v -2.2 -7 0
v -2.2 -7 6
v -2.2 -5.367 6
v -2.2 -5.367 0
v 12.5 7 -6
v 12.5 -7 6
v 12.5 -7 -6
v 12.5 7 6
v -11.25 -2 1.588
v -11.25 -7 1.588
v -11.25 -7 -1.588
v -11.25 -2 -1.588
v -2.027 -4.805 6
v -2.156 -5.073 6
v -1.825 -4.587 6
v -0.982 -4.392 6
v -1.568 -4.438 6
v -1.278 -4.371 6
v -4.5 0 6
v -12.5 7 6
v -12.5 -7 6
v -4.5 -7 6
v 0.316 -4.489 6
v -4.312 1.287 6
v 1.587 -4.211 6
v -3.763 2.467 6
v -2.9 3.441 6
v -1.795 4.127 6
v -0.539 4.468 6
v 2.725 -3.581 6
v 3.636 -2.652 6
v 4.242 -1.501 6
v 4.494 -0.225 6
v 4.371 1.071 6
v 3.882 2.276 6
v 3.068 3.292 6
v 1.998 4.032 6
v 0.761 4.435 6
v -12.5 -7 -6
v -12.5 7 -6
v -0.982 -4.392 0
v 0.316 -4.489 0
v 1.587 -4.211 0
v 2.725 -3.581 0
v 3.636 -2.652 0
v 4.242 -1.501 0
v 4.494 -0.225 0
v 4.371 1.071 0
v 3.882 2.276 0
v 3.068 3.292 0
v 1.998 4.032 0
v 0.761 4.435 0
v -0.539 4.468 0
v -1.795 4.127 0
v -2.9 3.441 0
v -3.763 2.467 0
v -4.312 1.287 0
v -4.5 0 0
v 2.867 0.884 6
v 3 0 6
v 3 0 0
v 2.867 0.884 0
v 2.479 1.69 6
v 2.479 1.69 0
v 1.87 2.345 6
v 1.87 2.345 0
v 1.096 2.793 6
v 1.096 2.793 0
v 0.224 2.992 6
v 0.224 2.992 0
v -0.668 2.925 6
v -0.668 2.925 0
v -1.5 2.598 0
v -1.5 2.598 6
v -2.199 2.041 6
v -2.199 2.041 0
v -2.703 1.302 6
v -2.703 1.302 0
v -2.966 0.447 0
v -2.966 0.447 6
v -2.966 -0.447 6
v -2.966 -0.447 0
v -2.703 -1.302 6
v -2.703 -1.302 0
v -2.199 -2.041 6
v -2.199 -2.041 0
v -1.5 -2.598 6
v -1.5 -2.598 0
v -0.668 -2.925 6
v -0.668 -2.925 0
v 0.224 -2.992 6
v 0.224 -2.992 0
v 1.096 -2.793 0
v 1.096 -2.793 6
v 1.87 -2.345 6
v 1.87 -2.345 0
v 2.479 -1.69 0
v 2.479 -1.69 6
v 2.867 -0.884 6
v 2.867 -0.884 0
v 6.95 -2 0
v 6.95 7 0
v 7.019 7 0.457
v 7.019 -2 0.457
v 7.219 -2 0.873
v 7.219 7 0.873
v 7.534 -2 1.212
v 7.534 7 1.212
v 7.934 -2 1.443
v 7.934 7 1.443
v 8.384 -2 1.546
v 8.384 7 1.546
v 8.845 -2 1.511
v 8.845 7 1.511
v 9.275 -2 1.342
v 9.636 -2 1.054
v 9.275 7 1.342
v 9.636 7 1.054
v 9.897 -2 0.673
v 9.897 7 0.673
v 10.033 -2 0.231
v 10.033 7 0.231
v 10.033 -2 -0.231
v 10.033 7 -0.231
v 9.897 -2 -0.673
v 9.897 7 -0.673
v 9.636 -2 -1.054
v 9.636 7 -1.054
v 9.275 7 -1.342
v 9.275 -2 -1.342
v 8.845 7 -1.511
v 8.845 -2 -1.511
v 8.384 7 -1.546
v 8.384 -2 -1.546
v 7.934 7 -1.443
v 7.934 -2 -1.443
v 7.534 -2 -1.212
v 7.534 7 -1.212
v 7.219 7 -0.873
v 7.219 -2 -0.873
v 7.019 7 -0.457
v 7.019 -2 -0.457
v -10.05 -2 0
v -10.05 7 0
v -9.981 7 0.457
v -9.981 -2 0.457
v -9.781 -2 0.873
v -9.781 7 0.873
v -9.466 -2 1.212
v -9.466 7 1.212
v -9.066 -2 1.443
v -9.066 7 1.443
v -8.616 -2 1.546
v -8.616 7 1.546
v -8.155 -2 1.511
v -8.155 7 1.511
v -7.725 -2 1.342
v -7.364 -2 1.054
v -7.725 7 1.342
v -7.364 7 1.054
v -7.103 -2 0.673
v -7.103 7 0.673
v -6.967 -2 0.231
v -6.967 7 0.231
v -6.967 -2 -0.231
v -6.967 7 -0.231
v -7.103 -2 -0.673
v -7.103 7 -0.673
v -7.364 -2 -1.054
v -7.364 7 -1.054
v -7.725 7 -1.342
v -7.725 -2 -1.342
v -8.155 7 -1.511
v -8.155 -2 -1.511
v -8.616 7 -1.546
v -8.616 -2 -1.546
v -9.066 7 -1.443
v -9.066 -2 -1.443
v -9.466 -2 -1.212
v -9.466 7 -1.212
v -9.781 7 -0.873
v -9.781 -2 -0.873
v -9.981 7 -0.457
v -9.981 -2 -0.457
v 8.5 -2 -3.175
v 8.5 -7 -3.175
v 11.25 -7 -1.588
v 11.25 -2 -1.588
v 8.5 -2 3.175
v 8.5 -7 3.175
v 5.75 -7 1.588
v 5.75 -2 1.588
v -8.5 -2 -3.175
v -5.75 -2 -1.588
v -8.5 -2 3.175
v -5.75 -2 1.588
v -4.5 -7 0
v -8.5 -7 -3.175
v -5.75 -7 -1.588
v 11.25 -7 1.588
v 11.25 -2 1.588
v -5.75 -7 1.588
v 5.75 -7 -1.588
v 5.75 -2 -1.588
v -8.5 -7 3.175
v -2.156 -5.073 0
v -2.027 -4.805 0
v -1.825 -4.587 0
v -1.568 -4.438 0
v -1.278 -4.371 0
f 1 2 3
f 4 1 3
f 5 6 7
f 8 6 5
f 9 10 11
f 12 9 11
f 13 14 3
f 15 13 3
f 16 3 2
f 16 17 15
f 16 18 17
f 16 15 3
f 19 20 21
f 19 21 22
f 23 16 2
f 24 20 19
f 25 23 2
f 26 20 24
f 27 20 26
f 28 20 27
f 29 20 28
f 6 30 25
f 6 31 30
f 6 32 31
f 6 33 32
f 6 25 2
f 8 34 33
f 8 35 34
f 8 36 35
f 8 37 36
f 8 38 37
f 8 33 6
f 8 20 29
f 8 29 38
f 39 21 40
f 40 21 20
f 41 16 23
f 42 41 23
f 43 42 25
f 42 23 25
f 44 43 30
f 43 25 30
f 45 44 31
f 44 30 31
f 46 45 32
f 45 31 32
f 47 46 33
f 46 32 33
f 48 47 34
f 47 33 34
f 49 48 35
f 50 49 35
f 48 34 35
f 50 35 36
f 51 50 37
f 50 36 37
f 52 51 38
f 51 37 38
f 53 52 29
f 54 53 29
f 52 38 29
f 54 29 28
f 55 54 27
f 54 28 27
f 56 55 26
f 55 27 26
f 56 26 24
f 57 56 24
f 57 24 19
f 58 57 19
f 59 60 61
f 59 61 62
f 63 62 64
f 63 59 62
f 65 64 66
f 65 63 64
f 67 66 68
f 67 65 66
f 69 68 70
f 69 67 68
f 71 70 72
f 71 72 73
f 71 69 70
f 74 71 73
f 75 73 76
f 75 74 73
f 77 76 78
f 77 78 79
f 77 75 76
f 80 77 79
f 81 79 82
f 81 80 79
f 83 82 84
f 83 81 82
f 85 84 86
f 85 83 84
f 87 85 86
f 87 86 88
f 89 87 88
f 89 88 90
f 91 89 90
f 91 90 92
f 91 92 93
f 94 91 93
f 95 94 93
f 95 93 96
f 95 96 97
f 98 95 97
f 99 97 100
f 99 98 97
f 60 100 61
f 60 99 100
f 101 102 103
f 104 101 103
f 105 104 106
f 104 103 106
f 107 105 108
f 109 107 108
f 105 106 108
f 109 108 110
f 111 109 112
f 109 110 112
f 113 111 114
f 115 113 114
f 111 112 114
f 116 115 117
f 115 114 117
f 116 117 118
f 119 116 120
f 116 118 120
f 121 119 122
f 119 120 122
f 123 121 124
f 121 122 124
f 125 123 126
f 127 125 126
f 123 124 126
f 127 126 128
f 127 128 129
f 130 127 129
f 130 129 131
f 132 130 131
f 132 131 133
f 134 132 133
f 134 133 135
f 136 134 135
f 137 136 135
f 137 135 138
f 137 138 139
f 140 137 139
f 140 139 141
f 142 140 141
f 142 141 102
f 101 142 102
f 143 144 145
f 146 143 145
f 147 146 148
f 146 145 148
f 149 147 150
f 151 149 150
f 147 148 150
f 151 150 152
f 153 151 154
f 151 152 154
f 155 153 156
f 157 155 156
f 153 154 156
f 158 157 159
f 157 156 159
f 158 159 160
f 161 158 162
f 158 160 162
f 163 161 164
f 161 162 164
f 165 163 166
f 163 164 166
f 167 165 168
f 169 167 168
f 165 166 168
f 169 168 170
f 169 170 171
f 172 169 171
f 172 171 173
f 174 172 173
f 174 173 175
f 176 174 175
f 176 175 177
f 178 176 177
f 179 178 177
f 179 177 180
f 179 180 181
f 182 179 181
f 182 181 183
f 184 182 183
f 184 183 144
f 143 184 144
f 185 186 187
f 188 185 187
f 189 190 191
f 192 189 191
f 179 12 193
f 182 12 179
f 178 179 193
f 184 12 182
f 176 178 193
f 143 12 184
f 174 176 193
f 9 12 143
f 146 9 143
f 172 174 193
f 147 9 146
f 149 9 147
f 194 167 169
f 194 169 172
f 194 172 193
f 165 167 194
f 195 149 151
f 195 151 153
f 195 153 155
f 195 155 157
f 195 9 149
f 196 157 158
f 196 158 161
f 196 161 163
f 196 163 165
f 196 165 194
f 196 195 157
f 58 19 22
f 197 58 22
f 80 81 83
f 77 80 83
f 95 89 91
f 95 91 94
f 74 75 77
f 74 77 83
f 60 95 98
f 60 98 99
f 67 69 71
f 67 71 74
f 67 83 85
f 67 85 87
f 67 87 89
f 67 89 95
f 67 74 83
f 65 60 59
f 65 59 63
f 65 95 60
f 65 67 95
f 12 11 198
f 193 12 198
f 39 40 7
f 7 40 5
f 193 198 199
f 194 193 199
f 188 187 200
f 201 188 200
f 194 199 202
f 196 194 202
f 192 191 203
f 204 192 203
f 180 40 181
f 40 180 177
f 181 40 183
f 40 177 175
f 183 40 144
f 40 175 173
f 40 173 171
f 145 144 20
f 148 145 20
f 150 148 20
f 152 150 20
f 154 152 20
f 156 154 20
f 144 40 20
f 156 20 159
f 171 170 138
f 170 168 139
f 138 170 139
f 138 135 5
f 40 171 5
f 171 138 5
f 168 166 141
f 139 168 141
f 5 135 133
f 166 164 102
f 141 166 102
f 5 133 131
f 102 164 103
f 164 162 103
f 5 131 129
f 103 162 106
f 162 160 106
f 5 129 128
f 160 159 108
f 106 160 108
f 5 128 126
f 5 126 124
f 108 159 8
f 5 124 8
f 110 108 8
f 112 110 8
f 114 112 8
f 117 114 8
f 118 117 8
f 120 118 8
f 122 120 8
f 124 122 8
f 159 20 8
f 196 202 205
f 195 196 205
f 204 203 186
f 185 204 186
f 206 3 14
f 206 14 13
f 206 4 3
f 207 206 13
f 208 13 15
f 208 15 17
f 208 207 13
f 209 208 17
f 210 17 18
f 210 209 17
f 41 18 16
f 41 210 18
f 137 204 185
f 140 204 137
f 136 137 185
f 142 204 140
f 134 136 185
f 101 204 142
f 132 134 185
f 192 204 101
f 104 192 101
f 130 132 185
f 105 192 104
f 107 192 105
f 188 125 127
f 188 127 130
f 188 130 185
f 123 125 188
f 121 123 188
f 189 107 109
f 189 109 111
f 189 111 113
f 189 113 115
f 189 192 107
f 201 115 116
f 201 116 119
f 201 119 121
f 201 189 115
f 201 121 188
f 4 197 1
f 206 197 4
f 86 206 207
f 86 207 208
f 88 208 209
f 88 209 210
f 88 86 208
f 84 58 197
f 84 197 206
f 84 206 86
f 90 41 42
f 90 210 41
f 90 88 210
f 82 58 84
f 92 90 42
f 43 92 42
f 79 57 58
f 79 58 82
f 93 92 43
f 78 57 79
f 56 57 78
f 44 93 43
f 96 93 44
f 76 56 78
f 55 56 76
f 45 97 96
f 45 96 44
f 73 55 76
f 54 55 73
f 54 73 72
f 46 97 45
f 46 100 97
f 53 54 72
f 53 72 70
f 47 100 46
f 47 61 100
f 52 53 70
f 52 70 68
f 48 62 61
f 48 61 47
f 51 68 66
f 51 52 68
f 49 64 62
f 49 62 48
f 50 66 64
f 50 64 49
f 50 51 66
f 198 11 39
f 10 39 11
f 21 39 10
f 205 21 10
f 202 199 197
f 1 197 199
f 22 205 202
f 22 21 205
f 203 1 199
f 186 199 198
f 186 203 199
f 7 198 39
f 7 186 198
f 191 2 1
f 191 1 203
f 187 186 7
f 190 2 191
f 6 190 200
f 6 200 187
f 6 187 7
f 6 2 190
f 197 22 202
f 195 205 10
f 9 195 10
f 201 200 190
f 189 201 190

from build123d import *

# Parameters (mm, degrees)
SKETCH_W        = 25
SKETCH_H        = 14
PAD_DEPTH       = 6
SKETCH001_R     = 3
POCKET_DEPTH    = 6
SKETCH002_R     = 1.55
POCKET001_DEPTH = 15
POCKET002_DEPTH = 5
FILLET_R        = 1


with BuildPart() as part:
    # Sketch → Pad (new body, symmetric)
    with BuildSketch(Plane.XY):
        Rectangle(SKETCH_W, SKETCH_H)
    extrude(amount=PAD_DEPTH, both=True)

    # Sketch001 → Pocket (cut)
    with BuildSketch(Plane.XY.offset(6)):
        with BuildLine():
            ThreePointArc((-2.2, -3.925557), (3.882654, 2.274863), (-4.5, 0))
            Line((-4.5, 0), (-4.5, -7))
            Line((-4.5, -7), (-2.2, -7))
            Line((-2.2, -7), (-2.2, -3.925557))
        make_face()
        Circle(SKETCH001_R, mode=Mode.SUBTRACT)
    extrude(amount=-POCKET_DEPTH, mode=Mode.SUBTRACT)

    # Sketch002 → Pocket001 (cut)
    with BuildSketch(Plane(origin=(0, 7, 0), x_dir=(-1, 0, 0), z_dir=(0, 1, 0))):
        with Locations((-8.5, 0)):
            Circle(SKETCH002_R)
        with Locations((8.5, 0)):
            Circle(SKETCH002_R)
    extrude(amount=-POCKET001_DEPTH, mode=Mode.SUBTRACT)

    # Sketch003 → Pocket002 (cut)
    with BuildSketch(Plane.XZ.offset(7)):
        Polygon((-5.75, -1.587713), (-5.75, 1.587713), (-8.5, 3.175426), (-11.25, 1.587713), (-11.25, -1.587713), (-8.5, -3.175426), align=None)
        Polygon((5.75, -1.587713), (8.5, -3.175426), (11.25, -1.587713), (11.25, 1.587713), (8.5, 3.175426), (5.75, 1.587713), align=None)
    extrude(amount=-POCKET002_DEPTH, mode=Mode.SUBTRACT)

    # Fillet
    fillet_edges = [part.edges().sort_by_distance(p)[0] for p in [
        (-2.2, -3.925557, 3),
    ]]
    fillet(fillet_edges, radius=FILLET_R)


solid = part.part
